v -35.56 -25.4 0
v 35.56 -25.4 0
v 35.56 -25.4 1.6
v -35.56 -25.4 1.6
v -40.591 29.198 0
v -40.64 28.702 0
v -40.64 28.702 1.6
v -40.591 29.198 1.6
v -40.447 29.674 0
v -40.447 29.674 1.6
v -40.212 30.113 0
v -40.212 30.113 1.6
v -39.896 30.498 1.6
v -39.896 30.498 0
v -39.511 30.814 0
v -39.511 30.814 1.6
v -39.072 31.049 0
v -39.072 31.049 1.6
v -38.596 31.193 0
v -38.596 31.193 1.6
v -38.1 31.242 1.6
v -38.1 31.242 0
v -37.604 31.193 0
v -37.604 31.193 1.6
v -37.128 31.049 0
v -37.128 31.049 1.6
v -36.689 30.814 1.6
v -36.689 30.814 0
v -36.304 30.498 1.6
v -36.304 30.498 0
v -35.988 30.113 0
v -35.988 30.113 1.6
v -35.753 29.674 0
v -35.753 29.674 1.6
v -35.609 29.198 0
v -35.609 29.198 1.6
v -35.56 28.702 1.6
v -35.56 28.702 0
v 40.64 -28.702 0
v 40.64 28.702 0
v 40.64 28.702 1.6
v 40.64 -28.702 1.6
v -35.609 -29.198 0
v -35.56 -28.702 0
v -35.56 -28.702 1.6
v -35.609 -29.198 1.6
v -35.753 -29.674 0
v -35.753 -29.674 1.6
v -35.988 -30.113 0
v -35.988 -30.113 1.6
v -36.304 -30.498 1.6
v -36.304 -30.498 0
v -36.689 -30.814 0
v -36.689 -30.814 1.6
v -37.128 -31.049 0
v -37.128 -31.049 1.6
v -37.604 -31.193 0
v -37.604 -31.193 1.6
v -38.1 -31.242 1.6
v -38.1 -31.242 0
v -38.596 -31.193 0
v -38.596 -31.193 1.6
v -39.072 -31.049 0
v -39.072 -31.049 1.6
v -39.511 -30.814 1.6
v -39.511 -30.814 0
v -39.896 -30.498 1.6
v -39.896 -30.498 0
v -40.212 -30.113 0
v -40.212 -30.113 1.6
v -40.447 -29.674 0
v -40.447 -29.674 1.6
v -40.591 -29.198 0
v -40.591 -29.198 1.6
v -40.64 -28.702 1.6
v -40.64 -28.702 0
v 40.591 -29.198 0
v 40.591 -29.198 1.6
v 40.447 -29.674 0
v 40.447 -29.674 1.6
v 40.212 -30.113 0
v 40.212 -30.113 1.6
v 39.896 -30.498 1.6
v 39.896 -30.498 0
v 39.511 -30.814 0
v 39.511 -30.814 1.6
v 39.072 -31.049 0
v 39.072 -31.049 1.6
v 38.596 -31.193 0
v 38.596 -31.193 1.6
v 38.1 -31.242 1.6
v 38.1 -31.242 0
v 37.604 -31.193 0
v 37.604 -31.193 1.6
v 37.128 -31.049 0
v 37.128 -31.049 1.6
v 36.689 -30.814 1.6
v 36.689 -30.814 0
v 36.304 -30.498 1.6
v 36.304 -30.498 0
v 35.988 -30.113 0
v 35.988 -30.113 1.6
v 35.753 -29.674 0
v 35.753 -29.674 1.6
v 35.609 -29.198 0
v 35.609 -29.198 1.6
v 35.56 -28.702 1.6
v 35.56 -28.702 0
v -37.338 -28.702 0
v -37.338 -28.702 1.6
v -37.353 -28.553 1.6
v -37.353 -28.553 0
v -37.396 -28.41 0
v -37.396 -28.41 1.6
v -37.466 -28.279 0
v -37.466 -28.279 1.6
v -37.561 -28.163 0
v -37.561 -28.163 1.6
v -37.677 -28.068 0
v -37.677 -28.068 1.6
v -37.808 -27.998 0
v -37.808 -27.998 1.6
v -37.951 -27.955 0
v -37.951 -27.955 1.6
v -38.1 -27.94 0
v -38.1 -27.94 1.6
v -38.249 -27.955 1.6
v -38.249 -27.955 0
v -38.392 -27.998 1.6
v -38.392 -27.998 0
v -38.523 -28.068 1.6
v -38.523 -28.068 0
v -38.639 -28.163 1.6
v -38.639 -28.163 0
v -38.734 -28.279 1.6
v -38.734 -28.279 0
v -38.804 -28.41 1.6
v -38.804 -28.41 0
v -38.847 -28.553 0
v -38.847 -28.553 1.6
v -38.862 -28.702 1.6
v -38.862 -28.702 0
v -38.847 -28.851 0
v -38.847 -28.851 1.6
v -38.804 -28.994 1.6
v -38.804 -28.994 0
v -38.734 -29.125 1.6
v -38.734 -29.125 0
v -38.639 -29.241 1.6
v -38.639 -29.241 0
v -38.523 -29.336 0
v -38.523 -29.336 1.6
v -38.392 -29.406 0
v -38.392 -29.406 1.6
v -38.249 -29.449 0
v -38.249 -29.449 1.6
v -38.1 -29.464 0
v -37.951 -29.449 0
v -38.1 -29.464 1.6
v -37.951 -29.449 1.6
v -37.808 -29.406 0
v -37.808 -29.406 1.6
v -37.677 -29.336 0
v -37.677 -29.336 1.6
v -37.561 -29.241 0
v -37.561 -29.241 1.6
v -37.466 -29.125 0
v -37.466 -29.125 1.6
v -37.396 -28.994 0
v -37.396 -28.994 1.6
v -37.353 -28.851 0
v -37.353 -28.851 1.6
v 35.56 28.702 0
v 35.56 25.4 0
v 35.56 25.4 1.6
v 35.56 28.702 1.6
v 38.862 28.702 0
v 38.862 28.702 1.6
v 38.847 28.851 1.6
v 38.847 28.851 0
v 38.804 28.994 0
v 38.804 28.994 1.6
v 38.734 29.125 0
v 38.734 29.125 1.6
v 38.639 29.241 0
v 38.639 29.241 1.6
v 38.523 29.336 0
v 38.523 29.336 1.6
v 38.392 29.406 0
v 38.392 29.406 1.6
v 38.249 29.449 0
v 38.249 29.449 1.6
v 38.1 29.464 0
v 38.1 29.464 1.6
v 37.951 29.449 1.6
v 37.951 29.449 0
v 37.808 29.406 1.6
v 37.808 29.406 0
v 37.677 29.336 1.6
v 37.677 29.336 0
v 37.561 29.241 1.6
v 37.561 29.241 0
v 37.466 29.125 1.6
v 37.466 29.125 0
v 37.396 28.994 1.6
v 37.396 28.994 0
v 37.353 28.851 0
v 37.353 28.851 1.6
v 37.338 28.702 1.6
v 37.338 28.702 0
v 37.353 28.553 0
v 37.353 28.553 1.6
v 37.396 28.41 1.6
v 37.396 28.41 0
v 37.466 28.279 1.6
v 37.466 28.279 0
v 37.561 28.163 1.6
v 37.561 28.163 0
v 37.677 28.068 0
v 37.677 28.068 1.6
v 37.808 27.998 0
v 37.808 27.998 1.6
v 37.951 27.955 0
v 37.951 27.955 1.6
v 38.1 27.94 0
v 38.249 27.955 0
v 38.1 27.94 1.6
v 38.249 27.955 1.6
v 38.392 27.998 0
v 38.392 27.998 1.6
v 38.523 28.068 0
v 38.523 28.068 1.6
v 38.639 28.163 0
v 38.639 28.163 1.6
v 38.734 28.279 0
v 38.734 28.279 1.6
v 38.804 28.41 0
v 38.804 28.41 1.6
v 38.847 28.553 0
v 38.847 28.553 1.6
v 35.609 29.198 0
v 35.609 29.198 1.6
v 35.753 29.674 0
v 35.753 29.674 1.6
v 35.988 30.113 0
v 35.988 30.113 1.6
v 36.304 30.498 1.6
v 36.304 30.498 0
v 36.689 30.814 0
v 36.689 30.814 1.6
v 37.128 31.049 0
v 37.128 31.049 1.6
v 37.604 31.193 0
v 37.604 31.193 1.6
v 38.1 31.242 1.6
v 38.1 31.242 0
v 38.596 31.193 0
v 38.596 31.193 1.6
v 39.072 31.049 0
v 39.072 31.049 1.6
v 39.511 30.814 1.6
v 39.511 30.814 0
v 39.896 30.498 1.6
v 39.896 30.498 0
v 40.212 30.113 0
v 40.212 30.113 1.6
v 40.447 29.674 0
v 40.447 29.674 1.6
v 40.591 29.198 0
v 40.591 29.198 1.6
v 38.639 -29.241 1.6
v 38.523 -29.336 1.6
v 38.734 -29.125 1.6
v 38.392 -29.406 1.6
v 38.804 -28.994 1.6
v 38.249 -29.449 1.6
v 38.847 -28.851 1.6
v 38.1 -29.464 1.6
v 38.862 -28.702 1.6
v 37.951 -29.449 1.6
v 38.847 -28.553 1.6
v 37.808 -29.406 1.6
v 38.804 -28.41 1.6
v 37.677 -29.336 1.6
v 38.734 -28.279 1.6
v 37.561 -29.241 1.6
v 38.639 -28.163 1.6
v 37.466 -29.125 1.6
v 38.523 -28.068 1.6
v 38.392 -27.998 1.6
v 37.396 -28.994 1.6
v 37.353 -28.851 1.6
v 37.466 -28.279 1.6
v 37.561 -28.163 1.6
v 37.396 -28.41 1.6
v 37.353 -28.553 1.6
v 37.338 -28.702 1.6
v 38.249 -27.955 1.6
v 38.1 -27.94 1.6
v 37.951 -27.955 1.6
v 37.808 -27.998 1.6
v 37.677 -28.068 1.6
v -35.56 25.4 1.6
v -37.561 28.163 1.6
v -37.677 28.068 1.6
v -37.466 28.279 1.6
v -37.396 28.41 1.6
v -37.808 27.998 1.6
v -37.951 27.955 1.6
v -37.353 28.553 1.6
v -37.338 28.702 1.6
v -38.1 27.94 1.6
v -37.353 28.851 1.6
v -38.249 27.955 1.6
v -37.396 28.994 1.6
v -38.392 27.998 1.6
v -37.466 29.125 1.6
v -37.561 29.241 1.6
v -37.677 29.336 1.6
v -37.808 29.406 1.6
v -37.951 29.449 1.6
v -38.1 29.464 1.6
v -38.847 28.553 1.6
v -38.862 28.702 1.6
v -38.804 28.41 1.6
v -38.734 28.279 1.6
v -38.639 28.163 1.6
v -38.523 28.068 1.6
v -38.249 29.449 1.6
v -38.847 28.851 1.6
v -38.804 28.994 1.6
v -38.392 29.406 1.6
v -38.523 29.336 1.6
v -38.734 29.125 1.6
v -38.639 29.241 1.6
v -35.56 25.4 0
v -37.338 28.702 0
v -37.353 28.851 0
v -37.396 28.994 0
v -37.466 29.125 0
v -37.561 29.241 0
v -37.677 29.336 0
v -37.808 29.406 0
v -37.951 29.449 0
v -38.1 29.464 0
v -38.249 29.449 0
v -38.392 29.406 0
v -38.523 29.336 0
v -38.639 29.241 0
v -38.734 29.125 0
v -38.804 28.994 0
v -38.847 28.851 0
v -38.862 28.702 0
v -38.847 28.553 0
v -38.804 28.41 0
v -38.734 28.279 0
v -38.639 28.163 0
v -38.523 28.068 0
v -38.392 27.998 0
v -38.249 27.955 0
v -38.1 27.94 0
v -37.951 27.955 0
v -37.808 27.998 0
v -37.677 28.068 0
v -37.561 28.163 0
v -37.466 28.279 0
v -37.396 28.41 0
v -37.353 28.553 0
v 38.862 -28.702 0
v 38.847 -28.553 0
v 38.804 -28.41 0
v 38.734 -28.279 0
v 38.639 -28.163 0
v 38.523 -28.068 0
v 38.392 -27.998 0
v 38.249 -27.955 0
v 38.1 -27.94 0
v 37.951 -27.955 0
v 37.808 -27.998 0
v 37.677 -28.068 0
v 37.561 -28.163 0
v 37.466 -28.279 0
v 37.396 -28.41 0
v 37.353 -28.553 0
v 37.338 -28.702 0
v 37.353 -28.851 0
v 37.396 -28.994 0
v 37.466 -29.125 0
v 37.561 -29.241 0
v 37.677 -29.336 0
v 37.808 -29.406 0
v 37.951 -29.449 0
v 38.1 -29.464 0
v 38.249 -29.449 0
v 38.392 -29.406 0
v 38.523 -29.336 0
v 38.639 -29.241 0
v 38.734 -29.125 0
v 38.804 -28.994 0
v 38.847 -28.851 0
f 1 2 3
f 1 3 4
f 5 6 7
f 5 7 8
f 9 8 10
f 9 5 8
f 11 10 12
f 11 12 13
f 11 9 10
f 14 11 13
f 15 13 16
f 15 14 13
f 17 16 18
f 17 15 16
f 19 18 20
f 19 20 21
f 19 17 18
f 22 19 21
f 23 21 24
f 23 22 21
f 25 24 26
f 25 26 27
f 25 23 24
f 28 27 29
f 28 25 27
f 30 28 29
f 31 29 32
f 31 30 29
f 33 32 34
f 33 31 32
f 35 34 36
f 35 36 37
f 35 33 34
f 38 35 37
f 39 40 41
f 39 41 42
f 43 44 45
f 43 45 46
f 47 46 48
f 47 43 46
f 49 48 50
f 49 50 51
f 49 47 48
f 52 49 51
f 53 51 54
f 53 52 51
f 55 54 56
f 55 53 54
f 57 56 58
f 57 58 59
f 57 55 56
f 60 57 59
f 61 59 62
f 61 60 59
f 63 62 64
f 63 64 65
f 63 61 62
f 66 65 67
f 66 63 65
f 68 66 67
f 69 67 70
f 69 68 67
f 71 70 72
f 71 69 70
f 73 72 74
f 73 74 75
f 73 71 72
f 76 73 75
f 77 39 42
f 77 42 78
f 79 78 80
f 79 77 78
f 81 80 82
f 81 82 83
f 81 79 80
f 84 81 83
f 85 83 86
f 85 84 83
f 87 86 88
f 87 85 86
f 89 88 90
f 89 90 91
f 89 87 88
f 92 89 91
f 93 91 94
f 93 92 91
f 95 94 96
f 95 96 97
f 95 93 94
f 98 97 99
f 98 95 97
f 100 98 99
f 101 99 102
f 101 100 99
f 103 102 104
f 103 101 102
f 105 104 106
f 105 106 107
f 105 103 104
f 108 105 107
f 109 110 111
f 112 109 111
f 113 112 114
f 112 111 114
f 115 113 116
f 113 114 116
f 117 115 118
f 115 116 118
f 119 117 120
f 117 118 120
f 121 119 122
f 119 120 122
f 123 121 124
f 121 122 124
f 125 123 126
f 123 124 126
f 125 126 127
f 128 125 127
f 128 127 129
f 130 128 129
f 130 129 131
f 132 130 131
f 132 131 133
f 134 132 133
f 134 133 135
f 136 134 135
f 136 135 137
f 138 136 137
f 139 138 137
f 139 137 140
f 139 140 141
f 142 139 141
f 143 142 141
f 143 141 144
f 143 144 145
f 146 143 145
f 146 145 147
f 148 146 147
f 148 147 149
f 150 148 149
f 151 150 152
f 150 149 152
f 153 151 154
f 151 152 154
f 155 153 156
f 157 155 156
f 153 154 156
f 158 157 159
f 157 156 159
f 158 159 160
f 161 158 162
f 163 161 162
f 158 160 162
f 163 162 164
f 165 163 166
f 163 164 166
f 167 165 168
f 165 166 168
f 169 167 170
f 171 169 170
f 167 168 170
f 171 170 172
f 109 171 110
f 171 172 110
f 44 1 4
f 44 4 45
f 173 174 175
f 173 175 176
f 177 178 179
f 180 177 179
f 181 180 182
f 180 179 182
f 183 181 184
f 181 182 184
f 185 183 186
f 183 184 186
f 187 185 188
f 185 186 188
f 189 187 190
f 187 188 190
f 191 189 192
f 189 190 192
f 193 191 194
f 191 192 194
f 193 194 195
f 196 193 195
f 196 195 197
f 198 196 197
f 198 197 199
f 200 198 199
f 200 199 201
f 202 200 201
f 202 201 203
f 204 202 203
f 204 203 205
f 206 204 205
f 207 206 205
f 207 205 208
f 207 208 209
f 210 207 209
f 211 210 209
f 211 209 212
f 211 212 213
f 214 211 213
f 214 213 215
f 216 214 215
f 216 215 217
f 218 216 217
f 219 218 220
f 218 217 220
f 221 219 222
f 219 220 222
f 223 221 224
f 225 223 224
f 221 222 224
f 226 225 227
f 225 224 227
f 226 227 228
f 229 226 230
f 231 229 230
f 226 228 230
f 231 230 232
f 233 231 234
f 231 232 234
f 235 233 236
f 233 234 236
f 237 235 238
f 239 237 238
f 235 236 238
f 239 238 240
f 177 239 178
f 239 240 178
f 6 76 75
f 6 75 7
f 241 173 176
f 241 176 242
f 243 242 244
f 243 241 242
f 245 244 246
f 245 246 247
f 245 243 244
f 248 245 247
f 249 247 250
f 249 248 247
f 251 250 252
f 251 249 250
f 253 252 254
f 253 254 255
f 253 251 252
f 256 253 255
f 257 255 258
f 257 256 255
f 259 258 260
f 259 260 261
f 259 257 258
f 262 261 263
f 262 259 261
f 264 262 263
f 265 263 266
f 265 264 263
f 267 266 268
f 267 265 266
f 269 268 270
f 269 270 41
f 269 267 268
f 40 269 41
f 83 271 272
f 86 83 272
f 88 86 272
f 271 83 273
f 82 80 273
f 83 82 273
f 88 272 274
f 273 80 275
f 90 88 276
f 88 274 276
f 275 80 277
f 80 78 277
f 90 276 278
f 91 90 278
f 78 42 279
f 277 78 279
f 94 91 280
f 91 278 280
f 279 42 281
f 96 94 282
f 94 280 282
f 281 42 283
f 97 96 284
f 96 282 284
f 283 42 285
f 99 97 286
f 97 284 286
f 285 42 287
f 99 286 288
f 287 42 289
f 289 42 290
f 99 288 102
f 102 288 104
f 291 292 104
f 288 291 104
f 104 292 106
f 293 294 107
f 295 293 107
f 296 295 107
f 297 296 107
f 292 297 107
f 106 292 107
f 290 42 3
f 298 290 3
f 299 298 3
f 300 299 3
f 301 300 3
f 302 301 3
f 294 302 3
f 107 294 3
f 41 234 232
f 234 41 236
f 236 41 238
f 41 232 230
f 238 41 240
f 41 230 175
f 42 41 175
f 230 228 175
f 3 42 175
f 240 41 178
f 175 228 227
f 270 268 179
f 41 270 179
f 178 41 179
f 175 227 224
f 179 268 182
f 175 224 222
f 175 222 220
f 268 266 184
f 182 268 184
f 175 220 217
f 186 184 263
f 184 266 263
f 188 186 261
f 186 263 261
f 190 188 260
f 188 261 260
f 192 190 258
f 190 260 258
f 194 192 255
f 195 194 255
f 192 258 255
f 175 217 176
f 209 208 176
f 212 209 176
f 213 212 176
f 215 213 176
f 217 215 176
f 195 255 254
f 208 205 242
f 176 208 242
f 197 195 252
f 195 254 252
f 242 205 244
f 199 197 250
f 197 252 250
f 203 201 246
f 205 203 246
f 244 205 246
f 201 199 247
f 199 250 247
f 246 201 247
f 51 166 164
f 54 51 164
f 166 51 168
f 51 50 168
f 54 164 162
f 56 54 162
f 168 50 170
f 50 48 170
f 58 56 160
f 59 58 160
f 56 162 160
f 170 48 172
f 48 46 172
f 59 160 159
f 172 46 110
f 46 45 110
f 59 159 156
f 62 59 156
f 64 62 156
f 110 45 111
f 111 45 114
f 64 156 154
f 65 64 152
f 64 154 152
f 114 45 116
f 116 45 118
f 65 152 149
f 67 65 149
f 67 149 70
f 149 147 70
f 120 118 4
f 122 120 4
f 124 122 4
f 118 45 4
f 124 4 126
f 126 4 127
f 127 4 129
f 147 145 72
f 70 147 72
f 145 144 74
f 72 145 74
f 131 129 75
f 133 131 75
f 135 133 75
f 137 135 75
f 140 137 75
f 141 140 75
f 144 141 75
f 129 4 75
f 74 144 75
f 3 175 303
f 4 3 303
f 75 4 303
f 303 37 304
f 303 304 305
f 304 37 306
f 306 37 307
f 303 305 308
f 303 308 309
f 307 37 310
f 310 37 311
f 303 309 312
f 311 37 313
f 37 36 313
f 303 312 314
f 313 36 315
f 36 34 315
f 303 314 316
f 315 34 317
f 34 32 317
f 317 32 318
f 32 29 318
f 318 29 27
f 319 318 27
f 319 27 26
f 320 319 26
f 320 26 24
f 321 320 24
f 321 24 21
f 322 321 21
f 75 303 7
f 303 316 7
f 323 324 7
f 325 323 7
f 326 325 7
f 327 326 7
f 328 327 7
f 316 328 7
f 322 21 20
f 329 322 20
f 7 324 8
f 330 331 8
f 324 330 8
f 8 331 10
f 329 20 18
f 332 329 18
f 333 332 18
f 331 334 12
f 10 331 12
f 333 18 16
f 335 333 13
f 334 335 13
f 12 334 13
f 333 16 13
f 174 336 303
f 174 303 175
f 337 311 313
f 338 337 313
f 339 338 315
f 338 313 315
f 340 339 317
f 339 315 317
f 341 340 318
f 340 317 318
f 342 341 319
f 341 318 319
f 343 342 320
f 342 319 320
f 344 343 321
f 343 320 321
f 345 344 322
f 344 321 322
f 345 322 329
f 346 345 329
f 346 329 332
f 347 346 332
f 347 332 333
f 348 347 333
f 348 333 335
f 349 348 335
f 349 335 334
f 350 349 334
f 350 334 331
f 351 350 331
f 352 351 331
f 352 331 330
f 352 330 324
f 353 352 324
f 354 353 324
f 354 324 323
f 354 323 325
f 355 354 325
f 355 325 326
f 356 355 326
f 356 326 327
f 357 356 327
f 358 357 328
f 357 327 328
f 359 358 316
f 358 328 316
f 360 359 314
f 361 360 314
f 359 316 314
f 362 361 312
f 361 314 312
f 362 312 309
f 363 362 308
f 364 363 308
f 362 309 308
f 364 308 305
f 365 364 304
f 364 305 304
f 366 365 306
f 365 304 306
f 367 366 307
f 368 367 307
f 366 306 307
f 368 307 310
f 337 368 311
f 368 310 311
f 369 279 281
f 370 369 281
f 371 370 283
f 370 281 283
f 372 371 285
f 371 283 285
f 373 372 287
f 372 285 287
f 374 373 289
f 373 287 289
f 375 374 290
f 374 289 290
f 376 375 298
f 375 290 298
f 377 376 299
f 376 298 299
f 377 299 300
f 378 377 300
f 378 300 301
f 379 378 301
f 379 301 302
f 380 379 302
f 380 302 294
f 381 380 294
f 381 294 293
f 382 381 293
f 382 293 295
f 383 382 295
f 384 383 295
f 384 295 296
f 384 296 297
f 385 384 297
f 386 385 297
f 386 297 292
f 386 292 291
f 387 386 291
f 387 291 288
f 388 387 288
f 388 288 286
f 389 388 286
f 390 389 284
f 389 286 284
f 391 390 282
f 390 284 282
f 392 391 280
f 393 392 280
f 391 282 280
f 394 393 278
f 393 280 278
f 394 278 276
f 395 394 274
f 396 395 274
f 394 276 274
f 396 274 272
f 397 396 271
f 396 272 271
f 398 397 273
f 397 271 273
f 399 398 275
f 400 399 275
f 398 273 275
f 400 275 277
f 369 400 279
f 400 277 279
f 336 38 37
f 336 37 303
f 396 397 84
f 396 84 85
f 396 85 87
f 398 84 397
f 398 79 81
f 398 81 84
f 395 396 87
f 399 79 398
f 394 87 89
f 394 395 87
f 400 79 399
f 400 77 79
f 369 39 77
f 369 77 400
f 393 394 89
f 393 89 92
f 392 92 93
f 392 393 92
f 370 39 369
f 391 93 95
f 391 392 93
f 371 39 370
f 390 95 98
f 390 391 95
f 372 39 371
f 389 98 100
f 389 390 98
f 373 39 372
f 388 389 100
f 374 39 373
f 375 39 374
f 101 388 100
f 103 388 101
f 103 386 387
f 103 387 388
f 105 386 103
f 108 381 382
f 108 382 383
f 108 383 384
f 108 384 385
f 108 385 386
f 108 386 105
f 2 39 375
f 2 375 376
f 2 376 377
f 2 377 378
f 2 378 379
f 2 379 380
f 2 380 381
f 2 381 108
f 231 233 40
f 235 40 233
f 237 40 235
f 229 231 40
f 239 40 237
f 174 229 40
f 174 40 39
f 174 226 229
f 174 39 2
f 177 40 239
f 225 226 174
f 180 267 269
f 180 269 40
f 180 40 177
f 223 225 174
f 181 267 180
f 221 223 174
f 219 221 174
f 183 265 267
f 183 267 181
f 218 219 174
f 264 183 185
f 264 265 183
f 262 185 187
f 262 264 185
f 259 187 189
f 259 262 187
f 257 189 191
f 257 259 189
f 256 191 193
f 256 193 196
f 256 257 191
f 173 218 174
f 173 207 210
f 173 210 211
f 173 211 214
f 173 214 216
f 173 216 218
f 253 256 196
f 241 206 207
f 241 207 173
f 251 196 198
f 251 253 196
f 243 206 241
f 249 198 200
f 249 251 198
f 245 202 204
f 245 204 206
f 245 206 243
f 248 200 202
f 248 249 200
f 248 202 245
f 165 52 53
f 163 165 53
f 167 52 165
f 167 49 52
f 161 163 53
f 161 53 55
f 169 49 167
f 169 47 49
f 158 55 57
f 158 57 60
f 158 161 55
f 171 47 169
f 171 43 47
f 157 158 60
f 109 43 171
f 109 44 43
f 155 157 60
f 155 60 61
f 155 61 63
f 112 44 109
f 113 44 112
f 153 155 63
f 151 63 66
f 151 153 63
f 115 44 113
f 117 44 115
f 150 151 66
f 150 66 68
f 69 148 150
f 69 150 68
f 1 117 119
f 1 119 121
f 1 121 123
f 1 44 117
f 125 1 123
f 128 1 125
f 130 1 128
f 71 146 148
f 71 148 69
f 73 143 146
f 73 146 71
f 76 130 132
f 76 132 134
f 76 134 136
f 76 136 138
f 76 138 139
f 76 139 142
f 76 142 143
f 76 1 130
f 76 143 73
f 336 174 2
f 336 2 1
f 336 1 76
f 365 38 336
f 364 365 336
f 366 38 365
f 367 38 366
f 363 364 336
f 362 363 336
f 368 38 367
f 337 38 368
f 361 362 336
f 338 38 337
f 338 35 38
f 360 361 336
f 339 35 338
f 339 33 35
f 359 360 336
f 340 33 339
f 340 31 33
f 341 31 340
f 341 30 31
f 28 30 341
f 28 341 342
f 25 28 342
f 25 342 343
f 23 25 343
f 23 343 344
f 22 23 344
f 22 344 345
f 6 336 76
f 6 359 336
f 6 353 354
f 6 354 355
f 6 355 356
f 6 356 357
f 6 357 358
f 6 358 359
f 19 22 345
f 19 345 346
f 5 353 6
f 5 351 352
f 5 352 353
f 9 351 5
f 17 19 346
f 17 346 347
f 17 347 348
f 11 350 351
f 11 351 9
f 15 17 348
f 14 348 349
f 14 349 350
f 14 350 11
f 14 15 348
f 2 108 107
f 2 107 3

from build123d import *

# Parameters (mm, degrees)
BOSS_EXTRUDE1_DEPTH = 1.6
SKETCH2_R           = 0.762
CUT_EXTRUDE1_DEPTH  = 2.6


with BuildPart() as part:
    # Sketch1 → Boss-Extrude1 (new body)
    with BuildSketch(Plane.XY):
        with BuildLine():
            Line((-35.56, 25.4), (35.56, 25.4))
            Line((35.56, 25.4), (35.56, 28.702))
            ThreePointArc((35.56, 28.702), (38.1, 31.242), (40.64, 28.702))
            Line((40.64, 28.702), (40.64, -28.702))
            ThreePointArc((40.64, -28.702), (38.1, -31.242), (35.56, -28.702))
            Line((35.56, -28.702), (35.56, -25.4))
            Line((35.56, -25.4), (-35.56, -25.4))
            Line((-35.56, -25.4), (-35.56, -28.702))
            ThreePointArc((-35.56, -28.702), (-38.1, -31.242), (-40.64, -28.702))
            Line((-40.64, -28.702), (-40.64, 28.702))
            ThreePointArc((-40.64, 28.702), (-38.1, 31.242), (-35.56, 28.702))
            Line((-35.56, 28.702), (-35.56, 25.4))
        make_face()
    extrude(amount=BOSS_EXTRUDE1_DEPTH)

    # Sketch2 → Cut-Extrude1 (cut, through all)
    with BuildSketch(Plane.XY.offset(1.6)):
        with Locations((38.1, 28.702)):
            Circle(SKETCH2_R)
        with Locations((-38.1, 28.702)):
            Circle(SKETCH2_R)
        with Locations((38.1, -28.702)):
            Circle(SKETCH2_R)
        with Locations((-38.1, -28.702)):
            Circle(SKETCH2_R)
    extrude(amount=-CUT_EXTRUDE1_DEPTH, mode=Mode.SUBTRACT)


solid = part.part
